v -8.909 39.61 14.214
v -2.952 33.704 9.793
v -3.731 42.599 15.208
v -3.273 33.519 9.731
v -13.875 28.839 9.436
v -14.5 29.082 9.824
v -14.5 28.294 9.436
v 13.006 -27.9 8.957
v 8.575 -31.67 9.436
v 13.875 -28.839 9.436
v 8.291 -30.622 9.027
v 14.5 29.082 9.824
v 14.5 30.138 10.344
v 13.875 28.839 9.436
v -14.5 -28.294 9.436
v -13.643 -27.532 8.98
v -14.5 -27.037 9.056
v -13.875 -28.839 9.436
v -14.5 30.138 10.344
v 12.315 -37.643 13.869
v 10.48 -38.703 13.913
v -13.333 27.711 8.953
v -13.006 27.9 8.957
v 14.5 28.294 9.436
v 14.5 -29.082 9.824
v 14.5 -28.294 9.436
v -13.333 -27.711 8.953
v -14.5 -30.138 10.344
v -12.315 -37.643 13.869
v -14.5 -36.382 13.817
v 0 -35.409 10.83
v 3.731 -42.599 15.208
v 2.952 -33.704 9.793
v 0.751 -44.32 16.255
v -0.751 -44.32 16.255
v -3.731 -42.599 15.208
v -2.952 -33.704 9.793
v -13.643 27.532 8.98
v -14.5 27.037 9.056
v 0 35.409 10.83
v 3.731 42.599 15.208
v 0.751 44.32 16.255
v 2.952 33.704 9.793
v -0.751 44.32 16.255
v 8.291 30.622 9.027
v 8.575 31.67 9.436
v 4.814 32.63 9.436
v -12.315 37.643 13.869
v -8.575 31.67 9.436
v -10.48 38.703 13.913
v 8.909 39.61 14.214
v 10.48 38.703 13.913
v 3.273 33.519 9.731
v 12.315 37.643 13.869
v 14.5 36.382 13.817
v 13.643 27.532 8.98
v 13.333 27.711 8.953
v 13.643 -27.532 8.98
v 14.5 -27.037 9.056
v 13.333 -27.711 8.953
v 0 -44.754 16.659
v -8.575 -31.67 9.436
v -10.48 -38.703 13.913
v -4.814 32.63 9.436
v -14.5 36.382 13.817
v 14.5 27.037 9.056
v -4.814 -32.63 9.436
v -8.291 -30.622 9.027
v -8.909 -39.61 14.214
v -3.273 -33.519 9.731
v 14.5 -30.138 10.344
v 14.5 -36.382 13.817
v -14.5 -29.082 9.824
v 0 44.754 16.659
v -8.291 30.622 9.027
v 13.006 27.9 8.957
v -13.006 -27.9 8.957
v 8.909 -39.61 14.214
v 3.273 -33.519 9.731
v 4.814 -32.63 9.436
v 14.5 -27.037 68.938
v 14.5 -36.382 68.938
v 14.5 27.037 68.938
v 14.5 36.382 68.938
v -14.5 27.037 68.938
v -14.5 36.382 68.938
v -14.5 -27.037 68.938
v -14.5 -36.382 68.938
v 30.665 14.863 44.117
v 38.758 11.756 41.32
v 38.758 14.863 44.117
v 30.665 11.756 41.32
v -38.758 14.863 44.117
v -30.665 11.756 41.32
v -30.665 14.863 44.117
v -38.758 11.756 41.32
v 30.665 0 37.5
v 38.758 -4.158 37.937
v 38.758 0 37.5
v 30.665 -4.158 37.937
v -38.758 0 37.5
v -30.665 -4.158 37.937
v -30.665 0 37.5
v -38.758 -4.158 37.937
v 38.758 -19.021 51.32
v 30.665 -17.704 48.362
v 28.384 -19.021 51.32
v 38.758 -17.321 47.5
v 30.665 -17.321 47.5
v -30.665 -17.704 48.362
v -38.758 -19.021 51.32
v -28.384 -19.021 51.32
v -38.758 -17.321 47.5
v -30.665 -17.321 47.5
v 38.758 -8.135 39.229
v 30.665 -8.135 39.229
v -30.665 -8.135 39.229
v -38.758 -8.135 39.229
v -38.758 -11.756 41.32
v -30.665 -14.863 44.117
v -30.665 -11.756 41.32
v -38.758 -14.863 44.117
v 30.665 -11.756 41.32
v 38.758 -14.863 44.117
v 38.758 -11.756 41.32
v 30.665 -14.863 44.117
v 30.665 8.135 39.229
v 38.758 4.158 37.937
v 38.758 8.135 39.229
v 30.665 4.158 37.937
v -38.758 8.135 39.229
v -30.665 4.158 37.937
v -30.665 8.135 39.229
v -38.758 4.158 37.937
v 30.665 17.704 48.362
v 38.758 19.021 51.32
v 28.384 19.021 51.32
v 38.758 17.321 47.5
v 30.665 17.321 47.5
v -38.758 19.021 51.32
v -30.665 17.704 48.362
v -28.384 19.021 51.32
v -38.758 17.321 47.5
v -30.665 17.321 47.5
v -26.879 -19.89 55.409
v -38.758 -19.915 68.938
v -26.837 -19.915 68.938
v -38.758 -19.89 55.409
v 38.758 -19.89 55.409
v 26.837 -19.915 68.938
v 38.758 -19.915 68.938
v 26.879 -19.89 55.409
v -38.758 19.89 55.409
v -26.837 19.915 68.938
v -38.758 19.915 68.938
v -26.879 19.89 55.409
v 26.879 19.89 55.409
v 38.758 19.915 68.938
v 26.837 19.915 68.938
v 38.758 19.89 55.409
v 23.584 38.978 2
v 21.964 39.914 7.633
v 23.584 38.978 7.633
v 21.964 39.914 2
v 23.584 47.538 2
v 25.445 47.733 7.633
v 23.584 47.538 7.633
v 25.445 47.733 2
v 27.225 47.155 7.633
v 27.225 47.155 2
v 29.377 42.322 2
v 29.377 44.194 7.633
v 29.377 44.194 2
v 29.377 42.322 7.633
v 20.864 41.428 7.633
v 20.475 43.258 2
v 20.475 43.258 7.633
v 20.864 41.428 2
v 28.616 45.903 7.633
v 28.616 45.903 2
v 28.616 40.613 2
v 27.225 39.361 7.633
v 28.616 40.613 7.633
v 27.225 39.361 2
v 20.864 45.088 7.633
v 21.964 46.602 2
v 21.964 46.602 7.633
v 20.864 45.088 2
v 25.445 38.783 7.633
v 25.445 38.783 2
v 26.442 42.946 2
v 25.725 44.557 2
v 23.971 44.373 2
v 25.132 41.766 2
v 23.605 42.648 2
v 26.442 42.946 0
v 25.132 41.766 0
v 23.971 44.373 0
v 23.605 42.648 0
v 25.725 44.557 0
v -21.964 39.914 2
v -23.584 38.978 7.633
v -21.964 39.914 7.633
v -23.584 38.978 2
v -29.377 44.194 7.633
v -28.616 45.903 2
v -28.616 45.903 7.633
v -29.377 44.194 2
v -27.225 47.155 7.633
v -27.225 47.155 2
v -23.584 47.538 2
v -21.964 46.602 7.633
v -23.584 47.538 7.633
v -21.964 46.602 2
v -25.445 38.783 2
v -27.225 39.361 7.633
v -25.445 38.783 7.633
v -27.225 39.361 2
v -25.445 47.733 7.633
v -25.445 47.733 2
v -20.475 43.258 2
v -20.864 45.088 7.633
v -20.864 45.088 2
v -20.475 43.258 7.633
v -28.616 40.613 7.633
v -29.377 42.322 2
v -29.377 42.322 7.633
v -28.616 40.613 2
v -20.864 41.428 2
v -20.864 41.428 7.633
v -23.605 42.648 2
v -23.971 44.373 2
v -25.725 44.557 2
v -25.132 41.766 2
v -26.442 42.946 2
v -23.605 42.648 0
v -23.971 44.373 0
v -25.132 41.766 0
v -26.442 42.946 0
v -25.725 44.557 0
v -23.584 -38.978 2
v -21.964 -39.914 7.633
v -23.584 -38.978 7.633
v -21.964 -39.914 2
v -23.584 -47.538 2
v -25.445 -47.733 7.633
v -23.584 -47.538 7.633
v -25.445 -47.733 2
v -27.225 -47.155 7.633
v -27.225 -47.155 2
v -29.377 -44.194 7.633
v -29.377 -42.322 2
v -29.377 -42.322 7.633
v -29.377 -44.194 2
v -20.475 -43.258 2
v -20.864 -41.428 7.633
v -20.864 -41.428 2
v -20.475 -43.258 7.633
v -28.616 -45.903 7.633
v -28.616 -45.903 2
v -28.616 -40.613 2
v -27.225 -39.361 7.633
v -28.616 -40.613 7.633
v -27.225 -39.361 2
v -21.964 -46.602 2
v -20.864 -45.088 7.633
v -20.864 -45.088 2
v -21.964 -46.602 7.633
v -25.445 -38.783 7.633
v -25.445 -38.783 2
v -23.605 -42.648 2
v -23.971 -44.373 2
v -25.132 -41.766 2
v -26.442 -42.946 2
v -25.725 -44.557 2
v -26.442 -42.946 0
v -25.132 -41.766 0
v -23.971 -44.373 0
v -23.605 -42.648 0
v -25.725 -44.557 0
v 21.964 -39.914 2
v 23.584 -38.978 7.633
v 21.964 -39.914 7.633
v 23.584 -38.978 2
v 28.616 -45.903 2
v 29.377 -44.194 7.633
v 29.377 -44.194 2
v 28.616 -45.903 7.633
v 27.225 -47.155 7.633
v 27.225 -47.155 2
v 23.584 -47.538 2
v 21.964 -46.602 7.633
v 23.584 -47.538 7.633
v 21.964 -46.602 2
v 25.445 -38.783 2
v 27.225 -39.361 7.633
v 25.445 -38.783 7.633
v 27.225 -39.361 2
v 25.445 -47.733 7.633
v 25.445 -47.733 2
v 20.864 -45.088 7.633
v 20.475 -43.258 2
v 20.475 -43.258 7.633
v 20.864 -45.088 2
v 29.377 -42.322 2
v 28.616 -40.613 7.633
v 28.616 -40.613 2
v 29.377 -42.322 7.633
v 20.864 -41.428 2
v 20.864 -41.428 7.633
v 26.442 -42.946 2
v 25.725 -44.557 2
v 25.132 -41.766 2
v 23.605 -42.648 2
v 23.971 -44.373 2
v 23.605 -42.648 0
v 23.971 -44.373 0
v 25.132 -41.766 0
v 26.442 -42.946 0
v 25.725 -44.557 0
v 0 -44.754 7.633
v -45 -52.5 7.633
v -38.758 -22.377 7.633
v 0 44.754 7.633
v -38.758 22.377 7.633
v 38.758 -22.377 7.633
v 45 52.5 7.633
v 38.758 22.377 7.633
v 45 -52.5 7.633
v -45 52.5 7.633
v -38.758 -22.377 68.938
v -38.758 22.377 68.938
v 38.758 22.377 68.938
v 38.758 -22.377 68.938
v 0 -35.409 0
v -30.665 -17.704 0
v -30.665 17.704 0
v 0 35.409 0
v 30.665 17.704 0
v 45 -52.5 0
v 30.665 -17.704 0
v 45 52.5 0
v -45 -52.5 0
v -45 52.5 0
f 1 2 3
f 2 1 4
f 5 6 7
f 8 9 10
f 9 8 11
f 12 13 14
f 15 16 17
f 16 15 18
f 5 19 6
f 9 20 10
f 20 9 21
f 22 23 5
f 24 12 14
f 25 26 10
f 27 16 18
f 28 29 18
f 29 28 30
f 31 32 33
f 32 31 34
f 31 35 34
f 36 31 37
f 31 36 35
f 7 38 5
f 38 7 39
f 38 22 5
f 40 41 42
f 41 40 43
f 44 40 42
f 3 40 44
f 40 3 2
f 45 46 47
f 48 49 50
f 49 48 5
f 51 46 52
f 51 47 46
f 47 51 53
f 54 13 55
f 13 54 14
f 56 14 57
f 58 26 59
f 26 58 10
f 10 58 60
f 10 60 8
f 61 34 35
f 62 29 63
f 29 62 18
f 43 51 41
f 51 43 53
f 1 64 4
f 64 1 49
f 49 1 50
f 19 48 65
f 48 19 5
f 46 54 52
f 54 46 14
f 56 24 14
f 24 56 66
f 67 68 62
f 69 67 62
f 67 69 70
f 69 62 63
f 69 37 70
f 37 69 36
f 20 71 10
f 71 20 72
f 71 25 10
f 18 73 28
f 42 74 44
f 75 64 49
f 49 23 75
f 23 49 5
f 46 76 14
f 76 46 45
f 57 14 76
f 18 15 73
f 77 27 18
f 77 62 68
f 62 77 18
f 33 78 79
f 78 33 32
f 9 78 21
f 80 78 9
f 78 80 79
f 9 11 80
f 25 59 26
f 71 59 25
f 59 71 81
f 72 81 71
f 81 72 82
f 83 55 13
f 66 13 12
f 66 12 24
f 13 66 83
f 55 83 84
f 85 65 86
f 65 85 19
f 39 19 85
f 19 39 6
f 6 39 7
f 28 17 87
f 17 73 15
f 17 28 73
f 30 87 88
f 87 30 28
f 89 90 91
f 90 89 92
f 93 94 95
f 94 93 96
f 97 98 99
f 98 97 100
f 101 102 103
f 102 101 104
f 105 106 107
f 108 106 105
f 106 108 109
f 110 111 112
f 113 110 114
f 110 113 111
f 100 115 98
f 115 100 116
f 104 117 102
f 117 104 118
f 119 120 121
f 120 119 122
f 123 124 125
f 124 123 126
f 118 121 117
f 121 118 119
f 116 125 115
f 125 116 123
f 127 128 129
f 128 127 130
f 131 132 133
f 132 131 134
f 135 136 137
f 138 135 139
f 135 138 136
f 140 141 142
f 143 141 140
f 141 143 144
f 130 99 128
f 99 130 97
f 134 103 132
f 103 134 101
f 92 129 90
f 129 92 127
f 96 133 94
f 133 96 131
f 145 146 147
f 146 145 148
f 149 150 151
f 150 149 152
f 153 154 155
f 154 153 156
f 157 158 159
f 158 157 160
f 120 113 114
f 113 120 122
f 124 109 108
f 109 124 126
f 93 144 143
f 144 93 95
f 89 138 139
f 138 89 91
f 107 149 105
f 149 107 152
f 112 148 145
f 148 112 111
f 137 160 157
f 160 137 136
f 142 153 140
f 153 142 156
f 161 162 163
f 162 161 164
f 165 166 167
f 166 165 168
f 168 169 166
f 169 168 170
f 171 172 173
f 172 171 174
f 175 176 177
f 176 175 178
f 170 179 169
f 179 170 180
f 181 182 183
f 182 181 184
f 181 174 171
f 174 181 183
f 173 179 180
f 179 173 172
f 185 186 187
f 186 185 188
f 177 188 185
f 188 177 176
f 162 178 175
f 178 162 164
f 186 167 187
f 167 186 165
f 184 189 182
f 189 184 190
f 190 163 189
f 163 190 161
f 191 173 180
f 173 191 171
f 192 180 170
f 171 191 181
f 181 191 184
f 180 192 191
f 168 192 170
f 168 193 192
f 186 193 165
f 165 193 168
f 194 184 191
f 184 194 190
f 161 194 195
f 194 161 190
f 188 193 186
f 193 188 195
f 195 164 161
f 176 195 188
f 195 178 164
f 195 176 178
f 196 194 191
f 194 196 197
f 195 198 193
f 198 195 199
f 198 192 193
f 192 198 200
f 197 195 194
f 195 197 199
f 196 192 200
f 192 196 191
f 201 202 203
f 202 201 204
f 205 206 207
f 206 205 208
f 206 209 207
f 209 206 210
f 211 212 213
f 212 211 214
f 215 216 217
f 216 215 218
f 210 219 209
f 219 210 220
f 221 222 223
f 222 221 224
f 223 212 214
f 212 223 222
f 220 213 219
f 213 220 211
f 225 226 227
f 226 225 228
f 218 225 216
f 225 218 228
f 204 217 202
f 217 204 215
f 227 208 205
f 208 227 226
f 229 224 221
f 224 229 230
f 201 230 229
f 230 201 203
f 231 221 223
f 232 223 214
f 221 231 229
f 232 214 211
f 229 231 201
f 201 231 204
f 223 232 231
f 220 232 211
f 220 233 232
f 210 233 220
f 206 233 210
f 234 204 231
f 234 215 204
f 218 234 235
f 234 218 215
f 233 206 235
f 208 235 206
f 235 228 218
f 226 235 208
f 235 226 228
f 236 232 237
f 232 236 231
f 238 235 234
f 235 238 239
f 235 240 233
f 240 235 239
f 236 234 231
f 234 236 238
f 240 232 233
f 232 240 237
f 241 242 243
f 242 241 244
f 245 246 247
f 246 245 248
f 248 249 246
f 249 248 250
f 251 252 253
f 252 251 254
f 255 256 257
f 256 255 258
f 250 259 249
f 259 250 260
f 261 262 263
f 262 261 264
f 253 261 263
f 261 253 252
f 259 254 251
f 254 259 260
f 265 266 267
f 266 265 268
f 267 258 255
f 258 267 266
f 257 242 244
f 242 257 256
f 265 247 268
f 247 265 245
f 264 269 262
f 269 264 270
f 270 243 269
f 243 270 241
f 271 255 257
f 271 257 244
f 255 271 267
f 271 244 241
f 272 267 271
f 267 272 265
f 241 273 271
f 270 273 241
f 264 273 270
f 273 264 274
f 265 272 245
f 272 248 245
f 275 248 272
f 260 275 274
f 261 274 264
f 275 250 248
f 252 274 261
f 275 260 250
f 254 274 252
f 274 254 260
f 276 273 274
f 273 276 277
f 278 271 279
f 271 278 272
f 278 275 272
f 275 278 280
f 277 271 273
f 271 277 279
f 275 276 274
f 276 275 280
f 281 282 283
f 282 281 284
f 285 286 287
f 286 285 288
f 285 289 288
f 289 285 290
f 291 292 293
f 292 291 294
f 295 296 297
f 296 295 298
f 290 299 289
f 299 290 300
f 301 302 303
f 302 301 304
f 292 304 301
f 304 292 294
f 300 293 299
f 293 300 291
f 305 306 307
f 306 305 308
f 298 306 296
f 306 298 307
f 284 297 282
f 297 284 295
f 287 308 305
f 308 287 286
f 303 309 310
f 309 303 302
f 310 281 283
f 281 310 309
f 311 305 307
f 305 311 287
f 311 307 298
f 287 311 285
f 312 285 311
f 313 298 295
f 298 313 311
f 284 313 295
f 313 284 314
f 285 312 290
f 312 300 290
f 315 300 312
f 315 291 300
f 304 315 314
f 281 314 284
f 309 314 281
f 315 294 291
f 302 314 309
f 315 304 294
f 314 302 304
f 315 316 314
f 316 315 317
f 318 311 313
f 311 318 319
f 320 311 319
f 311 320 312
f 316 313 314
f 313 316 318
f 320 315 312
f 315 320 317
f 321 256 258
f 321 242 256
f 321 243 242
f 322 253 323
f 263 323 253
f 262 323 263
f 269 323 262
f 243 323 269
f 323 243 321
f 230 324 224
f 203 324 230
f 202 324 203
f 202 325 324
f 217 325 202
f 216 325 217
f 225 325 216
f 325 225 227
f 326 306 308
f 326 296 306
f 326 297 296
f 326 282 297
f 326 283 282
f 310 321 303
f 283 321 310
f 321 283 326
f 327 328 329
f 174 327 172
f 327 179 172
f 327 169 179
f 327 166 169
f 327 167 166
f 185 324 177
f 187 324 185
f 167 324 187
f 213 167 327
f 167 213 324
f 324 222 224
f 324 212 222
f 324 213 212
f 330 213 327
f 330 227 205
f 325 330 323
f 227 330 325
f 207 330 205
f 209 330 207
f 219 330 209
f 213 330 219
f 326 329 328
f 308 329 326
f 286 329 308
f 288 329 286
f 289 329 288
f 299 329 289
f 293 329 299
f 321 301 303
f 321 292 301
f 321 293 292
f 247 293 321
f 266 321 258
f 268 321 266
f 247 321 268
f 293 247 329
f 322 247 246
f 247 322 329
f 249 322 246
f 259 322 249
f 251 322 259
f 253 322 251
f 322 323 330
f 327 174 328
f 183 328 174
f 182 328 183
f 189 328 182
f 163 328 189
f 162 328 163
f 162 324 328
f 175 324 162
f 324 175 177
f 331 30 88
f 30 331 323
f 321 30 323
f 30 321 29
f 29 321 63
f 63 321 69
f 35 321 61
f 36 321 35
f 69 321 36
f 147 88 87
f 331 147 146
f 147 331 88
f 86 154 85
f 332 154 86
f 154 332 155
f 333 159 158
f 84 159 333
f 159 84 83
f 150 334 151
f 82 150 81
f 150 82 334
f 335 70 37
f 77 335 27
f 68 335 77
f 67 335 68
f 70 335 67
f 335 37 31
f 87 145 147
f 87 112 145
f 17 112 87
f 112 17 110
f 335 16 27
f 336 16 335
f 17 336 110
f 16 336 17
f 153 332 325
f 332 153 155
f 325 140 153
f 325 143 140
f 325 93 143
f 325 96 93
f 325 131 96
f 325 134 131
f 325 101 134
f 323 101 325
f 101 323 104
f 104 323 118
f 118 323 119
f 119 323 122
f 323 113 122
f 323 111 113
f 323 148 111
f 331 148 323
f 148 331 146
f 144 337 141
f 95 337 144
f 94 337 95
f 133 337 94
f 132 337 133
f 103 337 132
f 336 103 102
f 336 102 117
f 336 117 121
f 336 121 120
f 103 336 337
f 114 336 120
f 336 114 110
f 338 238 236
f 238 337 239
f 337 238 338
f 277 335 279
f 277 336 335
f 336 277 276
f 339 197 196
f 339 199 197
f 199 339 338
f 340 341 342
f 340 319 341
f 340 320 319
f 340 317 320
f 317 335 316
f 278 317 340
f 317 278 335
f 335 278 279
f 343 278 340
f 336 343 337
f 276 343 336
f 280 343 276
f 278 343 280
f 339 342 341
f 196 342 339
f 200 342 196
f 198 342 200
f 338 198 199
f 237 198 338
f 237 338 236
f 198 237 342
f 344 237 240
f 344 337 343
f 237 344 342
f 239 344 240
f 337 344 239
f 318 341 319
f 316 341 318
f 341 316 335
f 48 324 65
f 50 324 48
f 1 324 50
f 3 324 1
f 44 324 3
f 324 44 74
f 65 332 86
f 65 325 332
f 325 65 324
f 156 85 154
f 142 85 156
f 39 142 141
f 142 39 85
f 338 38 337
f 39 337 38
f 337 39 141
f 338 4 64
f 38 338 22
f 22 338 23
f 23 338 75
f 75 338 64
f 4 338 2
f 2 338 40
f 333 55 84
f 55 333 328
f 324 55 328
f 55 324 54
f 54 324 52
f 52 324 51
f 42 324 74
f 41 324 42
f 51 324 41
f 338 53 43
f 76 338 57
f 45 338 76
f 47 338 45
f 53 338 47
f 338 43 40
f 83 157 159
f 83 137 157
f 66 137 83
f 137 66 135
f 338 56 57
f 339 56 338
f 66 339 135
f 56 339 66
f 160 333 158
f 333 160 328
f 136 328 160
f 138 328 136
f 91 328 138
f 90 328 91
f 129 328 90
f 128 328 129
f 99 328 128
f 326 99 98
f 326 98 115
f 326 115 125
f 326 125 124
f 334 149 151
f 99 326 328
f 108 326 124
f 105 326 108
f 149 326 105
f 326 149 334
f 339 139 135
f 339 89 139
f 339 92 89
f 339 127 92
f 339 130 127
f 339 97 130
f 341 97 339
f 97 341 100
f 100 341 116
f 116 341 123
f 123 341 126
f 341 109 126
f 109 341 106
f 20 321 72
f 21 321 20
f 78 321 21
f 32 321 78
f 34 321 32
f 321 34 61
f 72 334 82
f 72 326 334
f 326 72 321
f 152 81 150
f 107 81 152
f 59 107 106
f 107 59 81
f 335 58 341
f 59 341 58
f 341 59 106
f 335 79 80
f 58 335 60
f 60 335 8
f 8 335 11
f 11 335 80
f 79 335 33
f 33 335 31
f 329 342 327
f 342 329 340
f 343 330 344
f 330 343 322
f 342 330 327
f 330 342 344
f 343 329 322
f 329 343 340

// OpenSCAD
//$fa = 1.5;
//$fs = 1.5;


/* [Scooter Stand Details] */
// the base shape of the stand will be formed from this text!
standShape = " L";
// hown many sides on the stand
standFacets= 6; // [3:30]
// how big to make the stand
standSize = 1.3; // [1.0,1.1,1.2,1.3,1.4,1.5,1.6,1.7,1.8,1.9,2.0]
// pre-drilled screw holes
numberOfScrewHoles = 6; // [0:12]

/* [Scooter Details] */
// the diameter of the scooter wheel
wheelDiameter = 111; // [90:130]
wheelRadius = wheelDiameter/ 2.0; 
// how wide the wheel is
wheelWidth = 27;  // [20:40]
// how curved the tyre tread is
wheelTreadCurvature = 1.0; // [1.0,1.1,1.2,1.3,1.4,1.5,1.6,1.7,1.8,1.9,2.0]
// the smaller the number the snugger the tyre fits
wheelSupportCurvature = 1.2; // [1.0,1.1,1.2,1.3,1.4,1.5,1.6,1.7,1.8,1.9,2.0]

// the diameter of the axle ( or the width of the fork if its fatter)
axleDiameter = 40; // [30:60]
axleRadius = axleDiameter/ 2.0;
axleWidth = 60 + 0; 
//minimum thickness
wallThickness = 2; // [1:10]
tolerance = 2 + 0;
screwDistanceFromCenter= 0.9 * wheelRadius;


/* [Printable Max Dimensions] */
printableX = 90;
printableY = 105;
printableZ = 70;


module scooter(){
translate([0, 0, wheelRadius + wallThickness])
    union(){
        wheel();
        axle();
    }
}

module axle(){
    rotate([0, 270 , 0])
    hull(){
    cylinder(r=axleRadius, h= axleWidth * 10, center=true);
    translate([wheelDiameter * 10, 0, 0])
        cylinder(r=axleRadius + tolerance, h= axleWidth * 10, center=true);
    }
}

module wheel(){
    intersection(){
        scale([wheelTreadCurvature, wheelSupportCurvature, 1])    
            sphere(wheelRadius);
        cube([wheelWidth + tolerance,
        4 * wheelDiameter + tolerance,
        wheelDiameter + tolerance], 
        center= true);
    }
}

module screwHole(){
    union(){
    translate([0, 0, 2])
      cylinder(d = 9, h= axleWidth * 10);
    translate([0, 0, -tolerance])
      cylinder(d = 3, h= axleWidth * 10);
    }
}

module screws(){
    if(numberOfScrewHoles > 0){
        for(i = [0 : 360 / numberOfScrewHoles : 359]) {
            rotate([0, 0, i]) 
                translate([screwDistanceFromCenter, 0, 0])
                    screwHole();
        }
    }
}

module fancyStand(){
    color("cyan")
    rotate([0,0,90])
        rotate_extrude($fn= standFacets)
            text(standShape, size=wheelRadius * standSize);
}

module flatBottom(){
    translate([0, 0, wheelDiameter * 3 / -2])
    cube(wheelDiameter * 3, wheelDiameter * 3, wheelDiameter * 3, center=true);
}

module scooterStand(){
    difference(){
        fancyStand();
        #scooter();
        flatBottom();
        screws();
    }
}

module printableArea(){
    completeArea = [printableX, printableY, printableZ];
    translate([0, 0, printableZ/2])
        cube(completeArea, center=true);
    
}


intersection(){
    printableArea();
    scooterStand();
}


//    Written in 2017 by Grrrenn
//
//    This program is free software: you can redistribute it and/or modify
//    it under the terms of the GNU General Public License as published by
//    the Free Software Foundation, either version 3 of the License, or
//    (at your option) any later version.
//
//    This program is distributed in the hope that it will be useful,
//    but WITHOUT ANY WARRANTY; without even the implied warranty of
//    MERCHANTABILITY or FITNESS FOR A PARTICULAR PURPOSE.  See the
//    GNU General Public License for more details.
//
//    You should have received a copy of the GNU General Public License
//    along with this program.  If not, see <http://www.gnu.org/licenses/>.
